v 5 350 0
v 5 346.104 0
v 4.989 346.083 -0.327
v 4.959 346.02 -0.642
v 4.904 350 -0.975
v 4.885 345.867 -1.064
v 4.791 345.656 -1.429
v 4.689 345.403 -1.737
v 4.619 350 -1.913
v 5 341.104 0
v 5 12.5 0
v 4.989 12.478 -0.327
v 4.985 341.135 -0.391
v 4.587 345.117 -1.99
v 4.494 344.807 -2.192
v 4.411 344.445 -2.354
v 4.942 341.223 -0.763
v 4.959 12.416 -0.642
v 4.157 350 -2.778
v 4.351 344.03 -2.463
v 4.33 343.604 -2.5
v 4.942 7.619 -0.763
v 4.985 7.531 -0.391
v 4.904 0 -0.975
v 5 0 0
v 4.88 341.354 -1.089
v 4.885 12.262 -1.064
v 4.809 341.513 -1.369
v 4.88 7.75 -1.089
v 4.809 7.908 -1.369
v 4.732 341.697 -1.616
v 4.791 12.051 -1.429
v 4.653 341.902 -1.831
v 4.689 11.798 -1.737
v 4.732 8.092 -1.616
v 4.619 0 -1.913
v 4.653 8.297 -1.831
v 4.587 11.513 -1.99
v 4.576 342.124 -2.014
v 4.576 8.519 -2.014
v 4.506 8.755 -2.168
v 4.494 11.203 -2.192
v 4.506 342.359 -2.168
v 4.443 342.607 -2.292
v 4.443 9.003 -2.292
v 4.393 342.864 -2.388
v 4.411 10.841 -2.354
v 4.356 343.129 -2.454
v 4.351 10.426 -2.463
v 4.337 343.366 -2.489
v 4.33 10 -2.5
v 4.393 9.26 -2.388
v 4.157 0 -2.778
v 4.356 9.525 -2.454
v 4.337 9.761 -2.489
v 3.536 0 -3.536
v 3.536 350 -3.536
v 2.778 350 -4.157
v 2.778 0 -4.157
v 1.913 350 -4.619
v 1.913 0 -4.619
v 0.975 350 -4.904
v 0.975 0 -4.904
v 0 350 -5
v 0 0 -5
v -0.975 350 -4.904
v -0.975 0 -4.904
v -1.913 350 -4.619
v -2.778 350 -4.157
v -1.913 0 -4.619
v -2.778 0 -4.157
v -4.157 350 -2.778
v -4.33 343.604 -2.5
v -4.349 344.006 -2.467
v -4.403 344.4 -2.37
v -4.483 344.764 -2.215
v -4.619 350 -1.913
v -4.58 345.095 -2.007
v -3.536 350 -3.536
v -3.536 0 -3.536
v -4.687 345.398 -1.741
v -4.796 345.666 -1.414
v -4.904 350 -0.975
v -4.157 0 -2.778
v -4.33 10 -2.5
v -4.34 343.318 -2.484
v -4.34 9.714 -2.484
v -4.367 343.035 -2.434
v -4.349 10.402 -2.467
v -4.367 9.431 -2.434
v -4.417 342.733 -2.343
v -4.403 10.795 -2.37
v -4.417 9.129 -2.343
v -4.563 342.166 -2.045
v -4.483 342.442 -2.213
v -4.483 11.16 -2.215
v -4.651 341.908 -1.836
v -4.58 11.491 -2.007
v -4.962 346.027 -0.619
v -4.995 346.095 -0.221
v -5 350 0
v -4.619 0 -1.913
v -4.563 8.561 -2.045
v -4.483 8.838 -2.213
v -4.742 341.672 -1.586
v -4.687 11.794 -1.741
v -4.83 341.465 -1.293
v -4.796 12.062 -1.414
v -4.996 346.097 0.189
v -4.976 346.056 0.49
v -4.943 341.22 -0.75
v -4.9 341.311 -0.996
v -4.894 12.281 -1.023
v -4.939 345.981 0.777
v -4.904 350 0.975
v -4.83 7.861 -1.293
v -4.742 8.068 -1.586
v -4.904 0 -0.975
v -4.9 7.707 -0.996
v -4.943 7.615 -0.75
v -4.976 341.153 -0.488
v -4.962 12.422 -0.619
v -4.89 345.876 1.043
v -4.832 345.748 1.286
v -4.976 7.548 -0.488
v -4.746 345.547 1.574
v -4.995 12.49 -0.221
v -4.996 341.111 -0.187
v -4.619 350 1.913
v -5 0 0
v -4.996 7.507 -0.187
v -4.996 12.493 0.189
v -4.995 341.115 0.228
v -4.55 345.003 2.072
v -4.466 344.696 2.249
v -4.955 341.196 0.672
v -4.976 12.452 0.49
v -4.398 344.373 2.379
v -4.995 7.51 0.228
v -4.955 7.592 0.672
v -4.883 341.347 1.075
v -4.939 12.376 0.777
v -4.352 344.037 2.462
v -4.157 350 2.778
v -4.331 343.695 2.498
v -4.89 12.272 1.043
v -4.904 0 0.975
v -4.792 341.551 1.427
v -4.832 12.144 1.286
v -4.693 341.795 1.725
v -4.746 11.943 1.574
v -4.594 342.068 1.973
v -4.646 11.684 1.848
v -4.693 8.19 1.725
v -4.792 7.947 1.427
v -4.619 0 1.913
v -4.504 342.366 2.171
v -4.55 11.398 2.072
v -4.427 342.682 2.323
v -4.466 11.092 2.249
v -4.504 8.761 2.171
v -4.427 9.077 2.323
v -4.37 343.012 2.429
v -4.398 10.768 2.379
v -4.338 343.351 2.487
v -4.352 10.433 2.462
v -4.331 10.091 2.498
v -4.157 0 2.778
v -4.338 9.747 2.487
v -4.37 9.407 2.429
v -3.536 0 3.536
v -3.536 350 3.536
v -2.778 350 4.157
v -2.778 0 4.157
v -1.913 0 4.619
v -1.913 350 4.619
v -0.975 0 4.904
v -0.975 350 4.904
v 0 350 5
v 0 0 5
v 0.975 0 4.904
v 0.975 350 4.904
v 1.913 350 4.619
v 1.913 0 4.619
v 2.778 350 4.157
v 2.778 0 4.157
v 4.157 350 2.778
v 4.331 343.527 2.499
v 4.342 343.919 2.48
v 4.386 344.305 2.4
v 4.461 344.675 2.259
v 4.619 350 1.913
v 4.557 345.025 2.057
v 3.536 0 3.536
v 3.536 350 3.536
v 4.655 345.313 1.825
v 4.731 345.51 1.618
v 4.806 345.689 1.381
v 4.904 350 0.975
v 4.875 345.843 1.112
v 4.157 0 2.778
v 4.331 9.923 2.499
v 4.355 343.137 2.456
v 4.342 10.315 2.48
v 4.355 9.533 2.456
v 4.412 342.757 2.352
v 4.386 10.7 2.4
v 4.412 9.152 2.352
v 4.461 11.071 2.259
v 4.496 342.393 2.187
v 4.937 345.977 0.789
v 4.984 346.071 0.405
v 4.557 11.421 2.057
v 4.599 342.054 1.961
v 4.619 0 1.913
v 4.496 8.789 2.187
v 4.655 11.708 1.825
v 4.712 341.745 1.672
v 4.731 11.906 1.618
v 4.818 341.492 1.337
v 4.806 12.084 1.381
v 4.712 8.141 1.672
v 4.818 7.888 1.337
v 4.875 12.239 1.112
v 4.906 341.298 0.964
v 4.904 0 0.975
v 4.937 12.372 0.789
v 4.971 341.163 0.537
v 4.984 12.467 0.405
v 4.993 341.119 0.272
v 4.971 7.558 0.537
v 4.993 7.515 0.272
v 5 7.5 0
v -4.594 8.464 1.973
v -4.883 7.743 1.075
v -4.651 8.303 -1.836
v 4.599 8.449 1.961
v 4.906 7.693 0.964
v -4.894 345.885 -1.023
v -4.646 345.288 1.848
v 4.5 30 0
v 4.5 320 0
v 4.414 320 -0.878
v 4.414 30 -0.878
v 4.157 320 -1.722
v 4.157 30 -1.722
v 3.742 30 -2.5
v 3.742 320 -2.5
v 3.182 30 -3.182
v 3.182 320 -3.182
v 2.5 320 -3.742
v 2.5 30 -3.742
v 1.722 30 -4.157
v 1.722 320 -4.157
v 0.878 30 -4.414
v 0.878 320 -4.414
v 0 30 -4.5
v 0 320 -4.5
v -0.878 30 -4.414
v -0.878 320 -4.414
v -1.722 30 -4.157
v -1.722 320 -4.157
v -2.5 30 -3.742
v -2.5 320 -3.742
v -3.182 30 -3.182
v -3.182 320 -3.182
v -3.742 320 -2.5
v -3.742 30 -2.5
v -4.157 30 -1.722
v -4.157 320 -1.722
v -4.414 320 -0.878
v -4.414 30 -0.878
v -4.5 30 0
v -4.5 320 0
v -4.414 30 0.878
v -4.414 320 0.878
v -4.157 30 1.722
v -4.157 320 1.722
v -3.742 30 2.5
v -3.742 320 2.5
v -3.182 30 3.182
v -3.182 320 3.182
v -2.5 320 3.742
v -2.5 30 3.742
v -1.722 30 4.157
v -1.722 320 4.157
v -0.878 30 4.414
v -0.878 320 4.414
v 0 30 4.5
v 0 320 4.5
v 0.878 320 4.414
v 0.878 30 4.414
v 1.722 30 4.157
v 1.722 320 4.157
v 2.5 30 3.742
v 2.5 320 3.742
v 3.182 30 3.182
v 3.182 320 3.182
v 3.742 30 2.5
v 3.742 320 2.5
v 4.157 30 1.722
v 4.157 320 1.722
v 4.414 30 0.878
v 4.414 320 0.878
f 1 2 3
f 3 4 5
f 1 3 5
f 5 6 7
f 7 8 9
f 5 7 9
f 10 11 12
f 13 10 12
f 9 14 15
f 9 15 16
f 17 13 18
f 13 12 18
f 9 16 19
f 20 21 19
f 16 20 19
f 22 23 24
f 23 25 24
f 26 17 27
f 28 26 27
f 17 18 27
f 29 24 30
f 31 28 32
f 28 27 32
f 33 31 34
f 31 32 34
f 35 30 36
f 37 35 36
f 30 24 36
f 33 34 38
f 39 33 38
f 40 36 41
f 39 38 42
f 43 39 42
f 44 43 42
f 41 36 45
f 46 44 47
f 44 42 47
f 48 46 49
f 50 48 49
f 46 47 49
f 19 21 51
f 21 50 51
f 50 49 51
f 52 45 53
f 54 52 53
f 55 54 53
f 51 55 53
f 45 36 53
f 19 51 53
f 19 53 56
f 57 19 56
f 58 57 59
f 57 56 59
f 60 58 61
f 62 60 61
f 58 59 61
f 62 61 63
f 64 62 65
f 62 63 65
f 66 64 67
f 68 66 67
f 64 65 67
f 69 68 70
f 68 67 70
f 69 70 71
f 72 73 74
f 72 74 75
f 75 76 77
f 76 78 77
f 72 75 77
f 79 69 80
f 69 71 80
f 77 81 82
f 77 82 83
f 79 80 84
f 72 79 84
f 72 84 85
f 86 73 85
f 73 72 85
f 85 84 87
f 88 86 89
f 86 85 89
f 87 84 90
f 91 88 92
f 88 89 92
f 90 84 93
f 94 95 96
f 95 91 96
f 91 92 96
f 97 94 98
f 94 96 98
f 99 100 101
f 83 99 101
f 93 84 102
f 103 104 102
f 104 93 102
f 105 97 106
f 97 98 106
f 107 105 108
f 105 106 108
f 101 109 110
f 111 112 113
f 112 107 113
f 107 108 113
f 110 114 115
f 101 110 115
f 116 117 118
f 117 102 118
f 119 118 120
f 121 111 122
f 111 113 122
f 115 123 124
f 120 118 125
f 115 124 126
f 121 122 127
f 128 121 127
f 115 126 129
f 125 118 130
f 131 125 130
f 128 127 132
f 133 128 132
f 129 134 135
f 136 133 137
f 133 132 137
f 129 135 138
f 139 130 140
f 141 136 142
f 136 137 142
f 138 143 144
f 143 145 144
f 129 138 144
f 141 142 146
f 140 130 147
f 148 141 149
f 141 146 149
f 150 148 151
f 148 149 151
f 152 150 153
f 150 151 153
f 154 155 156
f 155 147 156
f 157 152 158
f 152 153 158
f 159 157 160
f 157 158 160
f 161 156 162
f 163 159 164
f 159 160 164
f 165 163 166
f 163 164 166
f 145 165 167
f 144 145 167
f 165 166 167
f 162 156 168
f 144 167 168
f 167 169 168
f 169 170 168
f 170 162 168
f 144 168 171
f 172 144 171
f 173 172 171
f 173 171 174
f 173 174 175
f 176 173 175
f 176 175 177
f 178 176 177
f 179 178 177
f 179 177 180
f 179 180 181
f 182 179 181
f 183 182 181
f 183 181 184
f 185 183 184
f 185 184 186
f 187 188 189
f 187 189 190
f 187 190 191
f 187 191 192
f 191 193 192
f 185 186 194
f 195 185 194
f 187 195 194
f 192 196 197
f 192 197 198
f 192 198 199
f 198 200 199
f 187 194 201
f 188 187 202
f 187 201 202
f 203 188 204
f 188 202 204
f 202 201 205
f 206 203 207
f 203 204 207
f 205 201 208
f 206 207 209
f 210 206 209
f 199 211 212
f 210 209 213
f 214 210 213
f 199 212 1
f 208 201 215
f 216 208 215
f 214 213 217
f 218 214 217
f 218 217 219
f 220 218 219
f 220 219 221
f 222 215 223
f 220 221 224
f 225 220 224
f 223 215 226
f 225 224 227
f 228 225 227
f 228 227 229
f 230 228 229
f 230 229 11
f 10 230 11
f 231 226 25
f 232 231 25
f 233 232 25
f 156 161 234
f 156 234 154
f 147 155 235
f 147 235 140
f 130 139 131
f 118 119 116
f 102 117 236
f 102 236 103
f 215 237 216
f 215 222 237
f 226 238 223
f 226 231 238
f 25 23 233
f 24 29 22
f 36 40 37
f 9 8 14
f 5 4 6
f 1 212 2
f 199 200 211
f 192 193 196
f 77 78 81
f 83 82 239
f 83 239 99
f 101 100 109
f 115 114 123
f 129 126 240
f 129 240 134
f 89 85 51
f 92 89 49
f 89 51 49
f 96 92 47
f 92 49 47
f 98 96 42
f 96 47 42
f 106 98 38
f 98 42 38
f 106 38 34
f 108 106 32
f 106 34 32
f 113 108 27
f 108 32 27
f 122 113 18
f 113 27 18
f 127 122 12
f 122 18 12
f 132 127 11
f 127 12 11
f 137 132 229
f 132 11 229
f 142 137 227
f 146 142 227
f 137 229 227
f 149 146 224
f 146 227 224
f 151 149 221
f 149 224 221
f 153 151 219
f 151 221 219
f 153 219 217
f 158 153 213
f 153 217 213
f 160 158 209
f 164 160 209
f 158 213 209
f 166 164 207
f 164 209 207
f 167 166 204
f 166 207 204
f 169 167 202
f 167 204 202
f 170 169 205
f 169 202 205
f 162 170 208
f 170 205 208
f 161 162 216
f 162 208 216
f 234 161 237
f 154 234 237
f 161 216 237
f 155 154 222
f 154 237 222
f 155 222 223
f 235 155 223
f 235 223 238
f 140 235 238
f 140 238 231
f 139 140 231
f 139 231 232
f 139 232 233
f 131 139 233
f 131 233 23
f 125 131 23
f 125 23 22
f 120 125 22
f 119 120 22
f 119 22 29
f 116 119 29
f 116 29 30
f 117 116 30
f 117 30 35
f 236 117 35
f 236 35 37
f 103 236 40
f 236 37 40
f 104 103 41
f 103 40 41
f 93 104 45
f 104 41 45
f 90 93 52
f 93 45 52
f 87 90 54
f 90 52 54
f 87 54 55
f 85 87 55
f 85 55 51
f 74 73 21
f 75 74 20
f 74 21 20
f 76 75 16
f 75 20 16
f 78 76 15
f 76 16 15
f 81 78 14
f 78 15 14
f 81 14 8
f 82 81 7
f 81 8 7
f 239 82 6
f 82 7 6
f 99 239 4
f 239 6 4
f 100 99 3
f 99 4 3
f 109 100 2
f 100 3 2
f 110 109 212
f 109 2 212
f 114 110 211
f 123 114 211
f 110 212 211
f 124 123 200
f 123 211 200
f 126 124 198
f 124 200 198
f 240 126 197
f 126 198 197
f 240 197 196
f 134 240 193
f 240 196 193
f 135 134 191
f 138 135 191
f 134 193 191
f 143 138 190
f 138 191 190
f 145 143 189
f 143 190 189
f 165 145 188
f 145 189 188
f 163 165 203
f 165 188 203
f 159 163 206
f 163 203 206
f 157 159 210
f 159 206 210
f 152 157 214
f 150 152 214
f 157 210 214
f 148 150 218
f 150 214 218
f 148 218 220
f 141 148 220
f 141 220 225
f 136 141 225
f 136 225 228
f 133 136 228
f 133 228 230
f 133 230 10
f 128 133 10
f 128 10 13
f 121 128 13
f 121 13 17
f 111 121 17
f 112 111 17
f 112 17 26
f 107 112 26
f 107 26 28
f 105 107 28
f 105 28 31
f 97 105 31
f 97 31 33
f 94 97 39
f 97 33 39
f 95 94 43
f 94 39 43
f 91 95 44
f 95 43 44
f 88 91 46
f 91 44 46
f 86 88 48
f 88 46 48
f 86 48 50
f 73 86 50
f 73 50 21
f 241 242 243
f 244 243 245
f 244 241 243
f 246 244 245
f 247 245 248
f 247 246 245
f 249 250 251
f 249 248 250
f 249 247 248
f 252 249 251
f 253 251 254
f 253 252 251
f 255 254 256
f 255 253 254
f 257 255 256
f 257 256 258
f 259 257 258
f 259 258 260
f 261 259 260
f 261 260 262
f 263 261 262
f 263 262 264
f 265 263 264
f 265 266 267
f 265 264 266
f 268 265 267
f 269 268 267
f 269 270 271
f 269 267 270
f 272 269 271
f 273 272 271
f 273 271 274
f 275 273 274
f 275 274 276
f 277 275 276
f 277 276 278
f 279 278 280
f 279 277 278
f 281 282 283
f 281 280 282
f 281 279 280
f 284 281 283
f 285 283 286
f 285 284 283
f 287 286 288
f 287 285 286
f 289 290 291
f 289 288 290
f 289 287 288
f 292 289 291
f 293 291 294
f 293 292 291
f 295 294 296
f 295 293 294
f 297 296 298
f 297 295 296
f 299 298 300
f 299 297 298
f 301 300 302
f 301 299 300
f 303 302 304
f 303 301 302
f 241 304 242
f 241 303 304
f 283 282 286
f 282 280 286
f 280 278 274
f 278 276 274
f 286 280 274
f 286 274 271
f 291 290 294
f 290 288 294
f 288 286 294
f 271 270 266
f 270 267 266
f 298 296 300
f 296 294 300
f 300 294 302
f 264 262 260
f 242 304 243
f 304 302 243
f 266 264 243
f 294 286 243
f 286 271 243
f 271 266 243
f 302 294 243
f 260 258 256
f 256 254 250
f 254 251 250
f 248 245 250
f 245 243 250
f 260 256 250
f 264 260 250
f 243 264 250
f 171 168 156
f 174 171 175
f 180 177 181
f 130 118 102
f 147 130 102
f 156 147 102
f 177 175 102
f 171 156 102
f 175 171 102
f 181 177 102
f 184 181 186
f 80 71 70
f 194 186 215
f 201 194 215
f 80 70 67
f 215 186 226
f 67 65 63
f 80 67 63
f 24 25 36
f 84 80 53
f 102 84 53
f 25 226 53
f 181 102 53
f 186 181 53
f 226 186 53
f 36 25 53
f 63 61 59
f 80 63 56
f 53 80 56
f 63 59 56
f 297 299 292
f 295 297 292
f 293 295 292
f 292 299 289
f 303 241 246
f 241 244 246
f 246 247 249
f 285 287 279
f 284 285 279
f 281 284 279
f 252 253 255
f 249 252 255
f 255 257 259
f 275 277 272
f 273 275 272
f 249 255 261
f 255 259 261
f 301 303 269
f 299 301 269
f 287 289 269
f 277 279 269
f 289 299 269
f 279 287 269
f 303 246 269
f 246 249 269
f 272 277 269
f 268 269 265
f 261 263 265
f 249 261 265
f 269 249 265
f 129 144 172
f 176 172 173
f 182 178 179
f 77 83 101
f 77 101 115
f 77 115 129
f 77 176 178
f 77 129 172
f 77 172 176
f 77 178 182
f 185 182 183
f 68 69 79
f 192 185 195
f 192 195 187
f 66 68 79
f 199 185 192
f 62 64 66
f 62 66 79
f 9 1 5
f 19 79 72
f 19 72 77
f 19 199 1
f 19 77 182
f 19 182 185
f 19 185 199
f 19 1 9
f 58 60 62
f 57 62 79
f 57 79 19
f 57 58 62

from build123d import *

# Parameters (mm, degrees)
SKETCH1_R           = 5
SKETCH1_R_2         = 4.5
BOSS_EXTRUDE1_DEPTH = 350
SKETCH2_R           = 5
BOSS_EXTRUDE2_DEPTH = 30
SKETCH3_R           = 5
BOSS_EXTRUDE4_DEPTH = 30
SKETCH4_R           = 2.5
CUT_EXTRUDE1_DEPTH  = 15
SKETCH5_R           = 2.5
CUT_EXTRUDE2_DEPTH  = 15


with BuildPart() as part:
    # Sketch1 → Boss-Extrude1 (new body)
    with BuildSketch(Plane(origin=(0, 0, 0), x_dir=(1, 0, 0), z_dir=(0, 1, 0))):
        Circle(SKETCH1_R)
        Circle(SKETCH1_R_2, mode=Mode.SUBTRACT)
    extrude(amount=BOSS_EXTRUDE1_DEPTH)

    # Sketch2 → Boss-Extrude2 (add)
    with BuildSketch(Plane(origin=(0, 350, 0), x_dir=(1, 0, 0), z_dir=(0, 1, 0))):
        Circle(SKETCH2_R)
    extrude(amount=-BOSS_EXTRUDE2_DEPTH)

    # Sketch3 → Boss-Extrude4 (add)
    with BuildSketch(Plane(origin=(0, 0, 0), x_dir=(-1, 0, 0), z_dir=(0, -1, 0))):
        Circle(SKETCH3_R)
    extrude(amount=-BOSS_EXTRUDE4_DEPTH)

    # Sketch4 → Cut-Extrude1 (cut, symmetric)
    with BuildSketch(Plane(origin=(0, 0, 0), x_dir=(0, 0, -1), z_dir=(1, 0, 0))):
        with Locations((0, 10)):
            Circle(SKETCH4_R)
    extrude(amount=CUT_EXTRUDE1_DEPTH, both=True, mode=Mode.SUBTRACT)

    # Sketch5 → Cut-Extrude2 (cut, symmetric)
    with BuildSketch(Plane(origin=(0, 0, 0), x_dir=(0, 0, -1), z_dir=(1, 0, 0))):
        with Locations((0, 343.604340323)):
            Circle(SKETCH5_R)
    extrude(amount=CUT_EXTRUDE2_DEPTH, both=True, mode=Mode.SUBTRACT)


solid = part.part
